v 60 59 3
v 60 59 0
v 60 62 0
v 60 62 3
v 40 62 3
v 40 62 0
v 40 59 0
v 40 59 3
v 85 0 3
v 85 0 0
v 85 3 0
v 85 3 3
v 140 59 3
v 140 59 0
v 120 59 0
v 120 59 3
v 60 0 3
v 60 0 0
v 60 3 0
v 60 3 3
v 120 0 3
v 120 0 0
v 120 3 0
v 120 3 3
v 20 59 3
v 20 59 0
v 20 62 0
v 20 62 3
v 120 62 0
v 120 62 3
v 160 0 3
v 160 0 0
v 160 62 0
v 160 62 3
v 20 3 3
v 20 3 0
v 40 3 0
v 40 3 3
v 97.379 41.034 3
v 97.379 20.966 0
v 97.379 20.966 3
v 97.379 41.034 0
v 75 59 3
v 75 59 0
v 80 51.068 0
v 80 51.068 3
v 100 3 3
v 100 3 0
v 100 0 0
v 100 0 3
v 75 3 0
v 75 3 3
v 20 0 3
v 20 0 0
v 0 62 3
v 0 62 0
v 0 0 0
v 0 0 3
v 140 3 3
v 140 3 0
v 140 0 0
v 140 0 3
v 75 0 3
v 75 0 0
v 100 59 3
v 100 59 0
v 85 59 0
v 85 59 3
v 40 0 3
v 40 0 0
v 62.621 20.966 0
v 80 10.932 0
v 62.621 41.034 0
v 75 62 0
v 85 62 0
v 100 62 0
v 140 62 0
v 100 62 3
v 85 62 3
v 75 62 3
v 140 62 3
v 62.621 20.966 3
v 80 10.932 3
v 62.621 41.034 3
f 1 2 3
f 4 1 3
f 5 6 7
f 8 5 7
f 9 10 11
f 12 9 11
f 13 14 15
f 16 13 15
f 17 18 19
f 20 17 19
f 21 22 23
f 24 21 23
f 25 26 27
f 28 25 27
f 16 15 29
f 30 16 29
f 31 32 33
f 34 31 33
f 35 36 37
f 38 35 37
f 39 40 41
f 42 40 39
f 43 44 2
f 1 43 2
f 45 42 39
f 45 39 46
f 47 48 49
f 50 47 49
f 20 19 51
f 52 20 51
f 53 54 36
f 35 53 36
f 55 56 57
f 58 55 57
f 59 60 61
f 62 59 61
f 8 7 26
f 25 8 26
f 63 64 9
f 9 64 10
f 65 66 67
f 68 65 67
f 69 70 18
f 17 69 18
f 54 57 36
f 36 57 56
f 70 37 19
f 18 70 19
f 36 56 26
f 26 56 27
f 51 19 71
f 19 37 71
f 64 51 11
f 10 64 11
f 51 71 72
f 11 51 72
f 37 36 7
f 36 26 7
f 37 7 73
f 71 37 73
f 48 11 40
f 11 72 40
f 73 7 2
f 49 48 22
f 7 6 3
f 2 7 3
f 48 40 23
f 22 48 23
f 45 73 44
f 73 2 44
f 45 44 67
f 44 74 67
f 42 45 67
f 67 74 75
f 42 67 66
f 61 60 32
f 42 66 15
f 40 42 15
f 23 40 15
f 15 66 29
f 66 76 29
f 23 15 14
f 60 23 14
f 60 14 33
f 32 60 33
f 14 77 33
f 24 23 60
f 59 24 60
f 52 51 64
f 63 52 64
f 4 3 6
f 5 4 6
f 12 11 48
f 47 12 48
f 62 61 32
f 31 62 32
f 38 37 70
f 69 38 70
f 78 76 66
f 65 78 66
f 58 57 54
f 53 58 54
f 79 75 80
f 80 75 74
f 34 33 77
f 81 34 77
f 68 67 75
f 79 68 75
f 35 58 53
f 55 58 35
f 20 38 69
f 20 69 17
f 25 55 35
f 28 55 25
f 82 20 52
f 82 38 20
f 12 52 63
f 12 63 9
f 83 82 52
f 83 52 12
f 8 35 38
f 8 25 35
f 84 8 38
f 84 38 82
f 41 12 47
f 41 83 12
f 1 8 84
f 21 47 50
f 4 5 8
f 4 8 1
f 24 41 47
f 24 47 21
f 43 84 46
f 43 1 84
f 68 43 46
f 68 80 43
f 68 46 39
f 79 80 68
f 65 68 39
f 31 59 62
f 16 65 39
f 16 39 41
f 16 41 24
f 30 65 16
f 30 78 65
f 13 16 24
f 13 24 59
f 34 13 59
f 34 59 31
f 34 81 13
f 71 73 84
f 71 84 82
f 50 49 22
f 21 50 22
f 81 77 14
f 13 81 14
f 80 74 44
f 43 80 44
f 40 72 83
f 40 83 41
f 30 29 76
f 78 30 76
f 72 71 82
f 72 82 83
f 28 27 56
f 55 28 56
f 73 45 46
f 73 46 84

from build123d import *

# Parameters (mm, degrees)
P_IDAT_VYSUNUT_M1_DEPTH = 3


with BuildPart() as part:
    # Skica1 → Přidat vysunutím1 (new body)
    with BuildSketch(Plane.XY):
        Polygon((20, 3), (23.5, 3), (40, 3), (40, 0), (60, 0), (60, 3), (75, 3), (75, 0), (85, 0), (85, 3), (100, 3), (100, 0), (120, 0), (120, 3), (136.5, 3), (140, 3), (140, 0), (160, 0), (160, 62), (140, 62), (140, 59), (120, 59), (120, 62), (100, 62), (100, 59), (85, 59), (85, 62), (75, 62), (75, 59), (60, 59), (60, 62), (40, 62), (40, 59), (20, 59), (20, 62), (0, 62), (0, 0), (20, 0), align=None)
        Polygon((80, 51.06787282), (62.620712338, 41.03393641), (62.620712338, 20.96606359), (80, 10.93212718), (97.379287662, 20.96606359), (97.379287662, 41.03393641), align=None, mode=Mode.SUBTRACT)
    extrude(amount=P_IDAT_VYSUNUT_M1_DEPTH)


solid = part.part
